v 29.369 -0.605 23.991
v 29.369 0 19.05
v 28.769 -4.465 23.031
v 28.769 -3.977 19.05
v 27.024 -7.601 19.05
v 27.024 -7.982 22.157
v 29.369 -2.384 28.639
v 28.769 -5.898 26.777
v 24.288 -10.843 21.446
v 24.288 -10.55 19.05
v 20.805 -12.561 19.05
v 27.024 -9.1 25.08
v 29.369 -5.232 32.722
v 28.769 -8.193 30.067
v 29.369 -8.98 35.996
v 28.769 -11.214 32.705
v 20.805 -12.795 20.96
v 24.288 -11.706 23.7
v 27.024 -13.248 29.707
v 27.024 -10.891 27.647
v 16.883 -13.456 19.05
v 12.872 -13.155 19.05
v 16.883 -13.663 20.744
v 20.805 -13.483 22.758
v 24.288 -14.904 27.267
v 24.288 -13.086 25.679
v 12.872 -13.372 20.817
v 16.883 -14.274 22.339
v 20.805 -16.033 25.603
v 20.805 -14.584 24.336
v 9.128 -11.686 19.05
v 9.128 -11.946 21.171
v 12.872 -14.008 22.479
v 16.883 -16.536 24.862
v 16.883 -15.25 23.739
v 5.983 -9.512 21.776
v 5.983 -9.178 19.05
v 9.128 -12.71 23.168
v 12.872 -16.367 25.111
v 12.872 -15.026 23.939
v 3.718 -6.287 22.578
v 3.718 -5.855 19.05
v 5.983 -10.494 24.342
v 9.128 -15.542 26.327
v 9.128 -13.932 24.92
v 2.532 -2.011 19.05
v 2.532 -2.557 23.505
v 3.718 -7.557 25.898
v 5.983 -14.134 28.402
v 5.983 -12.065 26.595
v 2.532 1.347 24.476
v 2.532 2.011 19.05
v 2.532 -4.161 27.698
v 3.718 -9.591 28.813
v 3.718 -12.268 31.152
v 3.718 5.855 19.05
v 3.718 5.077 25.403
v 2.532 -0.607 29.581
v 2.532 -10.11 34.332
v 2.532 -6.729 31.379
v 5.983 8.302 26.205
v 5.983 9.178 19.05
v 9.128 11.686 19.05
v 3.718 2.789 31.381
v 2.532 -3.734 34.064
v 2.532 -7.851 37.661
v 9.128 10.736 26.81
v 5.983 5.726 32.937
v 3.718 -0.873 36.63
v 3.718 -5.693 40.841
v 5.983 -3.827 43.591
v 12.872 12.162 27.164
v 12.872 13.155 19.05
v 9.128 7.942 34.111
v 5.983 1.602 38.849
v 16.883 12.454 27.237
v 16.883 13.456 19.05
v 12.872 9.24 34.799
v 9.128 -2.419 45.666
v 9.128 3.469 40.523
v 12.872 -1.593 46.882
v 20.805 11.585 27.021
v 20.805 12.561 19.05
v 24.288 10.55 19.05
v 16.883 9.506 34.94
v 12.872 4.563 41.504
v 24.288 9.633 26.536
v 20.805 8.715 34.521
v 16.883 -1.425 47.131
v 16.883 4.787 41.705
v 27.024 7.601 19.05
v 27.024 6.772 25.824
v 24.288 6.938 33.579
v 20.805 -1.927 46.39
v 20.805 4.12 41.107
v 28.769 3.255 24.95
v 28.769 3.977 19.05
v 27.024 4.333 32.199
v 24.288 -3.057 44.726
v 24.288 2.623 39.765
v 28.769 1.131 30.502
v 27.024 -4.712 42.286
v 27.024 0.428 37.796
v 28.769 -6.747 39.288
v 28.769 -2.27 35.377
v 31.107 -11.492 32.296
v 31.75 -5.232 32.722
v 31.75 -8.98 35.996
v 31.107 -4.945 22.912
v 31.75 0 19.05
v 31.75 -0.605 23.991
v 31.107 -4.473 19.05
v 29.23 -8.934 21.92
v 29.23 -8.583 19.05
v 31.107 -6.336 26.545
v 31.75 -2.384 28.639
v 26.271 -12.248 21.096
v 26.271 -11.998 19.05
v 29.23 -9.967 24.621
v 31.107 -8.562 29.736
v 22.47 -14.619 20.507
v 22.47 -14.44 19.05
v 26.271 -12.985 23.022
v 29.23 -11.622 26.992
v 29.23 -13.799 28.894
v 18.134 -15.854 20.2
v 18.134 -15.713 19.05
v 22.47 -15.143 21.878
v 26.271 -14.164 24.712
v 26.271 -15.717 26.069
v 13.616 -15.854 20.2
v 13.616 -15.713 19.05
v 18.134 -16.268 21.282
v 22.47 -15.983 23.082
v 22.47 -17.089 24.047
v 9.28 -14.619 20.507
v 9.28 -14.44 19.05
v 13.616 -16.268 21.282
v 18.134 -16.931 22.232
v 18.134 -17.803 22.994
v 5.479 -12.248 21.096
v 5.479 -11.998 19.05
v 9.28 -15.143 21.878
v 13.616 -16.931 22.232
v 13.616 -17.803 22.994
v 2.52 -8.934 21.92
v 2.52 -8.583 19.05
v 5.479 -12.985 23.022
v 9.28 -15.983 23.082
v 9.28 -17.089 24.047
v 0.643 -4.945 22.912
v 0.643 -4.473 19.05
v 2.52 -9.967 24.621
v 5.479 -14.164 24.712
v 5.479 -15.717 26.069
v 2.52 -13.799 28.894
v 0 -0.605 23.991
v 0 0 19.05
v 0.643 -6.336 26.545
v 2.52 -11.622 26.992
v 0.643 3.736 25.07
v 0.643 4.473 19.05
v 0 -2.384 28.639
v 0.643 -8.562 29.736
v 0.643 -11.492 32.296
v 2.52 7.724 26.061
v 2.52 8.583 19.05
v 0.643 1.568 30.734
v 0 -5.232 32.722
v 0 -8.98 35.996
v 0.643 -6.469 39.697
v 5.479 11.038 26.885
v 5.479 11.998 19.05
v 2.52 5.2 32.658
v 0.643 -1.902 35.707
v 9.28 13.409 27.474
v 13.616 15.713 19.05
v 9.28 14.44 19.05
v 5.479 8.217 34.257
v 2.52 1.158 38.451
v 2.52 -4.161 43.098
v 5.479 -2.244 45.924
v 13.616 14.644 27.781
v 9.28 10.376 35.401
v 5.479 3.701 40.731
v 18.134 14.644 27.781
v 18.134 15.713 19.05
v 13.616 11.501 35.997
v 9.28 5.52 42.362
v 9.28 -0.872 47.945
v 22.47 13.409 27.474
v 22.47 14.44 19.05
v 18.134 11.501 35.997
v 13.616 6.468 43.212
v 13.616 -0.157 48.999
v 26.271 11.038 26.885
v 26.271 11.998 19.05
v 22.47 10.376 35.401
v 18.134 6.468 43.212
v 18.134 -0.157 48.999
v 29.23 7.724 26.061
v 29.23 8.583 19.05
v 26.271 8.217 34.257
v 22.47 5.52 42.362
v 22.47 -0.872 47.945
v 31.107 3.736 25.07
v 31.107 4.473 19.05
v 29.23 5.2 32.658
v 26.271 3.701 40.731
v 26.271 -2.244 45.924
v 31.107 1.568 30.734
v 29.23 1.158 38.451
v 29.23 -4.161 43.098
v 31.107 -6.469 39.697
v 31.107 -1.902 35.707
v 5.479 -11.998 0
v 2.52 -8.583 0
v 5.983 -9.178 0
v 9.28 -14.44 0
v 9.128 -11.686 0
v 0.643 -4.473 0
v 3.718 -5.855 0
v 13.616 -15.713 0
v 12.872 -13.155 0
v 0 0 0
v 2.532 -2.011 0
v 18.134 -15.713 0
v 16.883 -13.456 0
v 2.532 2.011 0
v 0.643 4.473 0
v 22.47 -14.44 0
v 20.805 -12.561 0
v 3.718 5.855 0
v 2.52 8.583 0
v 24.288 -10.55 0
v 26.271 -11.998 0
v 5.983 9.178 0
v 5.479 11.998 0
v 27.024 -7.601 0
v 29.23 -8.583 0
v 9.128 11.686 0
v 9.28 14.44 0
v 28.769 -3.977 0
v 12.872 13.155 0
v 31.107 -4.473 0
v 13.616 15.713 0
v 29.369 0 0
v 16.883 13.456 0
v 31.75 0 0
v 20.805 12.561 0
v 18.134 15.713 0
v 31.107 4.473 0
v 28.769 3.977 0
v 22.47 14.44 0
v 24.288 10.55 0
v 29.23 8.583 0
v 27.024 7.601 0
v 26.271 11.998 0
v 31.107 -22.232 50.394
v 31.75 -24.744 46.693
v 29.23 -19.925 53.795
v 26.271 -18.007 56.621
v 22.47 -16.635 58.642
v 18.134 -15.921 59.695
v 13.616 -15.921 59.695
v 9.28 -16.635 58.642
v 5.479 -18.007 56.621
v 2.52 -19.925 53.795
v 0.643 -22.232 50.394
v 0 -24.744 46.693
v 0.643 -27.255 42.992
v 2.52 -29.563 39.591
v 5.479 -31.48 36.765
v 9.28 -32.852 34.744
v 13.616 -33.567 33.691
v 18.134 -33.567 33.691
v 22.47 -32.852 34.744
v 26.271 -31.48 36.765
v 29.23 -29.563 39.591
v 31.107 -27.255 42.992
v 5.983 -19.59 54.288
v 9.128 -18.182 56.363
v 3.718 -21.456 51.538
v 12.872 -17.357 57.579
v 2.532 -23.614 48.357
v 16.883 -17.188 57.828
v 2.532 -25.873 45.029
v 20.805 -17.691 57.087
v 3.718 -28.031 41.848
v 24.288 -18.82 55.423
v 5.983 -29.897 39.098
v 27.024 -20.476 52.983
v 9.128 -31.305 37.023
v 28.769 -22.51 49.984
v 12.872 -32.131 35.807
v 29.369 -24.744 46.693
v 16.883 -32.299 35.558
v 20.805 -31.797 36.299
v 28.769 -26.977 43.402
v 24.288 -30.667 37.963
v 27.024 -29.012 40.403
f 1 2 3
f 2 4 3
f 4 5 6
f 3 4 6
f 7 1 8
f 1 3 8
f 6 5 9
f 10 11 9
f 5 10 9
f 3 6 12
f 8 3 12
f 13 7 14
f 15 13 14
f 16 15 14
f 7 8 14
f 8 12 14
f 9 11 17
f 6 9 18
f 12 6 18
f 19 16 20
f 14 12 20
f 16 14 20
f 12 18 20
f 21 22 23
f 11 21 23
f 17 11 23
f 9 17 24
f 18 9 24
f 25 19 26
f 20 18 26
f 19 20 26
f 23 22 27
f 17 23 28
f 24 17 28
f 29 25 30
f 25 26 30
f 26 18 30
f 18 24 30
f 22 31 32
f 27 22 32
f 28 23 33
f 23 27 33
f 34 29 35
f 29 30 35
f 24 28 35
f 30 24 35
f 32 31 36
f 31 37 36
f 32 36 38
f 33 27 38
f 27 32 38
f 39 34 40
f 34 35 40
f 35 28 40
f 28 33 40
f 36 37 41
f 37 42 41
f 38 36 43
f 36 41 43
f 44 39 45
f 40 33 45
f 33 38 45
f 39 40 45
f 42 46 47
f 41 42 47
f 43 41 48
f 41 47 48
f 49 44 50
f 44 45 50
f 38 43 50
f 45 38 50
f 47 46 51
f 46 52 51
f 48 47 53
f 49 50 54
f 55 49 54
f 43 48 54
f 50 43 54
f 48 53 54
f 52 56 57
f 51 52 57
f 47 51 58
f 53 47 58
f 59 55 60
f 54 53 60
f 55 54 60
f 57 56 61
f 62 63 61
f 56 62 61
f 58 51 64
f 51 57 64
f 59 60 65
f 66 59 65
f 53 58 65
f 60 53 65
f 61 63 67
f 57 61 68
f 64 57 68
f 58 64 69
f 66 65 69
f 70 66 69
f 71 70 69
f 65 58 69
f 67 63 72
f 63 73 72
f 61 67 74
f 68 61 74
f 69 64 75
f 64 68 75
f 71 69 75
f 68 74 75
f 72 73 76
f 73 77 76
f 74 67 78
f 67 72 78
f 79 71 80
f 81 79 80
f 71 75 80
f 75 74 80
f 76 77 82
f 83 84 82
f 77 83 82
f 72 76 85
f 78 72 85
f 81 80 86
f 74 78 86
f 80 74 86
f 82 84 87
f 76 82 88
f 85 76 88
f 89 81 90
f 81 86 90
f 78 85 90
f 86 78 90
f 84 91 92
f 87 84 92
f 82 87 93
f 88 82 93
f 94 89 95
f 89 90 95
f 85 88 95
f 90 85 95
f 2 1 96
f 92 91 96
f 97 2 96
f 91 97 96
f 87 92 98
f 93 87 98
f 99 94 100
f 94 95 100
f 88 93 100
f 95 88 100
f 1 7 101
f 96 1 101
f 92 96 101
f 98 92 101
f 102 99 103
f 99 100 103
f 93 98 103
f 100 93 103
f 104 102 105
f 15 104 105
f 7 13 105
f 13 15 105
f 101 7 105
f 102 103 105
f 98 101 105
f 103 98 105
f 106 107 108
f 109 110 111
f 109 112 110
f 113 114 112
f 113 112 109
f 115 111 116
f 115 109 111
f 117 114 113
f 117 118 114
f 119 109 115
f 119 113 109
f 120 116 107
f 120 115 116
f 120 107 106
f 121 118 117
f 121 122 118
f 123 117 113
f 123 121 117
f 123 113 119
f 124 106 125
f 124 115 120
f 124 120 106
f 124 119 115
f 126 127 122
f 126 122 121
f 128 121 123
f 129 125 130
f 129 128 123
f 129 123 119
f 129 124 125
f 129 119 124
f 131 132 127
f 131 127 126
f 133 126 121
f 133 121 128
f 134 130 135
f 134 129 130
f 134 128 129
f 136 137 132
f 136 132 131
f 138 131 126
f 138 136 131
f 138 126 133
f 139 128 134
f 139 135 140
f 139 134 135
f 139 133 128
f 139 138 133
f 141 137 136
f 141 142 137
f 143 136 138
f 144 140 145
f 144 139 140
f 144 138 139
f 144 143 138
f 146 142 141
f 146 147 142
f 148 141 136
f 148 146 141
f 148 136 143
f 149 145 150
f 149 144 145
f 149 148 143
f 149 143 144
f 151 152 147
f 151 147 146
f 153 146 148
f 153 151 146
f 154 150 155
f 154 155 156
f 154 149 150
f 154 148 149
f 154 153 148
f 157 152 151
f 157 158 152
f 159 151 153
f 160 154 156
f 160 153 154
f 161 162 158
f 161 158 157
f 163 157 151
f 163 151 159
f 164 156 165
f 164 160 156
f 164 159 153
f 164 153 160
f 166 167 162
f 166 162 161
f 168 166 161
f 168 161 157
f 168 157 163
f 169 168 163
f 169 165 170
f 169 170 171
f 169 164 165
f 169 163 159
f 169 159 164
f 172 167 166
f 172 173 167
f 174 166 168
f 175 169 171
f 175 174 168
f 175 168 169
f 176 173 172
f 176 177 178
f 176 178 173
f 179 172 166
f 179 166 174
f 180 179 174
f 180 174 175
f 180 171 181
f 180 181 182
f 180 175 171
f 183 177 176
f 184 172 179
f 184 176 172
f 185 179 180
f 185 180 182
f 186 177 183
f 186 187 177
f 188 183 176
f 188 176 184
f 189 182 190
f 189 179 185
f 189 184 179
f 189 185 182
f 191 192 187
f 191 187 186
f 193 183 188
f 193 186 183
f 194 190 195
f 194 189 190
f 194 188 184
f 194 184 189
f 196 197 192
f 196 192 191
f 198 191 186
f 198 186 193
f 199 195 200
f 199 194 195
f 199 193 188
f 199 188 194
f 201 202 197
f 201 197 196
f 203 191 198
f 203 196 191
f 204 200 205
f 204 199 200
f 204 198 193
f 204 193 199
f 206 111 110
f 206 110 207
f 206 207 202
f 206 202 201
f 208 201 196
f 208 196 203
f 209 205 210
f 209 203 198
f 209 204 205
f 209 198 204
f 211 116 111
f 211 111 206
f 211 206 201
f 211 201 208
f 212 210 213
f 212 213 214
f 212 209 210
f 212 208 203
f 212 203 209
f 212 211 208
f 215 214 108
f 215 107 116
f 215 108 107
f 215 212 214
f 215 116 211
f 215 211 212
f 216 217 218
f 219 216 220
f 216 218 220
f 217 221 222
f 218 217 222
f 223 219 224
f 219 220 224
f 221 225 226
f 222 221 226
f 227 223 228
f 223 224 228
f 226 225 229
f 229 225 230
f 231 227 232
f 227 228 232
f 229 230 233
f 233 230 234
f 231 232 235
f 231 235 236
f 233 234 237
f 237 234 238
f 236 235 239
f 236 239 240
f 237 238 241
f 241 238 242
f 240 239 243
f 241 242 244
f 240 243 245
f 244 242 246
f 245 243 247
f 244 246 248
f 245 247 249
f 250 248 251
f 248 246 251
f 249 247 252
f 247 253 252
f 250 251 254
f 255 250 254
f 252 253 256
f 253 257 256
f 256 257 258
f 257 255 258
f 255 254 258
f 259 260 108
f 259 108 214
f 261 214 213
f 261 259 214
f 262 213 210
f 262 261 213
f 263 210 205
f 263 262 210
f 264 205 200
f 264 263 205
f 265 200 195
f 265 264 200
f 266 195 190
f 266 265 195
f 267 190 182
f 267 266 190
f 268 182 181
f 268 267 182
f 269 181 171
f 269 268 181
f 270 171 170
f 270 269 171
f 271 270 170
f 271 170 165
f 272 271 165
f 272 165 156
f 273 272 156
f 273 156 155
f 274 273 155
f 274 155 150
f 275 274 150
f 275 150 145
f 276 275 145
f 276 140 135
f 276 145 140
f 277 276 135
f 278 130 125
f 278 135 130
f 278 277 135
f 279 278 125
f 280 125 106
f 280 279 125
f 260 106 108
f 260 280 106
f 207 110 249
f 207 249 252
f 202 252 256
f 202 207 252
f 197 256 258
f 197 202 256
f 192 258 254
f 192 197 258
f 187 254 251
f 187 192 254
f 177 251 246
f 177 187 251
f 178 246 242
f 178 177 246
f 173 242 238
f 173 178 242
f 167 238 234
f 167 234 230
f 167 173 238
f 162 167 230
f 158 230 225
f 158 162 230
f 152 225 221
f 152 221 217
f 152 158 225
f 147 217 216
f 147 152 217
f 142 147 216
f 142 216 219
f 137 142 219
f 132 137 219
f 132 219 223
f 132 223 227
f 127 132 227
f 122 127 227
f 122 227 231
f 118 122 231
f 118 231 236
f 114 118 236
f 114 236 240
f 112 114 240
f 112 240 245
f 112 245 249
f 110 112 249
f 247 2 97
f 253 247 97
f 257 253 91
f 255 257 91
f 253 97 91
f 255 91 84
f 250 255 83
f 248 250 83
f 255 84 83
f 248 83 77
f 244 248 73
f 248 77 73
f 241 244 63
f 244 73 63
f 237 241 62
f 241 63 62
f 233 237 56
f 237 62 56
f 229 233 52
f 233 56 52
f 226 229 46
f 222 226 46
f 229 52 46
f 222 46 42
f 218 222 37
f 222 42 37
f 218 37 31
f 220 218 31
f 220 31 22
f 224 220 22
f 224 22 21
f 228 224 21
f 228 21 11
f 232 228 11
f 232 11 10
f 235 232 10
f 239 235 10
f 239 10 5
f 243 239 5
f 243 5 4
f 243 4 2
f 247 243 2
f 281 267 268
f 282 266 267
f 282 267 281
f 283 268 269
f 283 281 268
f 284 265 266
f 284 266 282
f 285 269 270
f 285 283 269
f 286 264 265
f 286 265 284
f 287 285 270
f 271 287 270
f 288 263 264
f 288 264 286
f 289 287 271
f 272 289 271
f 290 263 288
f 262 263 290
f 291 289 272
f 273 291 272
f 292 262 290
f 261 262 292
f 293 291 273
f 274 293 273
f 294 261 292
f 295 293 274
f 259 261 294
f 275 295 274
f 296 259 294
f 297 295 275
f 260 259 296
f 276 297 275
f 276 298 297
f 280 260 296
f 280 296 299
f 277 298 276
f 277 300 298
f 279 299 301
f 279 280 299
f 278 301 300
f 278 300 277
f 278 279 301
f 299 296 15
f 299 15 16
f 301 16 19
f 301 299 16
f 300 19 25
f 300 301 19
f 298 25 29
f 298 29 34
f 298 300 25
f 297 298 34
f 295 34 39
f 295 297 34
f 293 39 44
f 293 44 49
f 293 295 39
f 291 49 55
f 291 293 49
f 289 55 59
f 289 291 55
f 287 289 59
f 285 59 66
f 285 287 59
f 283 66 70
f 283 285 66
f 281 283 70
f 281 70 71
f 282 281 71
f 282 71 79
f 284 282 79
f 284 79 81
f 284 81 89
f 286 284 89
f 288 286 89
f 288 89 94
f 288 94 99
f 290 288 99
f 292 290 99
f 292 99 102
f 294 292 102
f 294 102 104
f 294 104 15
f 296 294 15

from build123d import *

# Parameters (mm, degrees)
F0_R   = 15.875
F0_R_2 = 13.49375


with BuildPart() as f2:
    # F2: sweep along a path in F1
    with BuildLine(Plane.YZ) as f2_path:
        Line((0, 0), (0, 19.05))
        ThreePointArc((0, 19.05), (-2.38381, 28.639399), (-8.980293, 35.996405))
        Line((-8.980293, 35.996405), (-24.743706, 46.693007))
    # F0 (on Top) → F2 (sweep)
    with BuildSketch(Plane.XY):
        with Locations((15.875, 0)):
            Circle(F0_R)
        with Locations((15.875, 0)):
            Circle(F0_R_2, mode=Mode.SUBTRACT)
    sweep(path=f2_path.line)


solid = f2.part
